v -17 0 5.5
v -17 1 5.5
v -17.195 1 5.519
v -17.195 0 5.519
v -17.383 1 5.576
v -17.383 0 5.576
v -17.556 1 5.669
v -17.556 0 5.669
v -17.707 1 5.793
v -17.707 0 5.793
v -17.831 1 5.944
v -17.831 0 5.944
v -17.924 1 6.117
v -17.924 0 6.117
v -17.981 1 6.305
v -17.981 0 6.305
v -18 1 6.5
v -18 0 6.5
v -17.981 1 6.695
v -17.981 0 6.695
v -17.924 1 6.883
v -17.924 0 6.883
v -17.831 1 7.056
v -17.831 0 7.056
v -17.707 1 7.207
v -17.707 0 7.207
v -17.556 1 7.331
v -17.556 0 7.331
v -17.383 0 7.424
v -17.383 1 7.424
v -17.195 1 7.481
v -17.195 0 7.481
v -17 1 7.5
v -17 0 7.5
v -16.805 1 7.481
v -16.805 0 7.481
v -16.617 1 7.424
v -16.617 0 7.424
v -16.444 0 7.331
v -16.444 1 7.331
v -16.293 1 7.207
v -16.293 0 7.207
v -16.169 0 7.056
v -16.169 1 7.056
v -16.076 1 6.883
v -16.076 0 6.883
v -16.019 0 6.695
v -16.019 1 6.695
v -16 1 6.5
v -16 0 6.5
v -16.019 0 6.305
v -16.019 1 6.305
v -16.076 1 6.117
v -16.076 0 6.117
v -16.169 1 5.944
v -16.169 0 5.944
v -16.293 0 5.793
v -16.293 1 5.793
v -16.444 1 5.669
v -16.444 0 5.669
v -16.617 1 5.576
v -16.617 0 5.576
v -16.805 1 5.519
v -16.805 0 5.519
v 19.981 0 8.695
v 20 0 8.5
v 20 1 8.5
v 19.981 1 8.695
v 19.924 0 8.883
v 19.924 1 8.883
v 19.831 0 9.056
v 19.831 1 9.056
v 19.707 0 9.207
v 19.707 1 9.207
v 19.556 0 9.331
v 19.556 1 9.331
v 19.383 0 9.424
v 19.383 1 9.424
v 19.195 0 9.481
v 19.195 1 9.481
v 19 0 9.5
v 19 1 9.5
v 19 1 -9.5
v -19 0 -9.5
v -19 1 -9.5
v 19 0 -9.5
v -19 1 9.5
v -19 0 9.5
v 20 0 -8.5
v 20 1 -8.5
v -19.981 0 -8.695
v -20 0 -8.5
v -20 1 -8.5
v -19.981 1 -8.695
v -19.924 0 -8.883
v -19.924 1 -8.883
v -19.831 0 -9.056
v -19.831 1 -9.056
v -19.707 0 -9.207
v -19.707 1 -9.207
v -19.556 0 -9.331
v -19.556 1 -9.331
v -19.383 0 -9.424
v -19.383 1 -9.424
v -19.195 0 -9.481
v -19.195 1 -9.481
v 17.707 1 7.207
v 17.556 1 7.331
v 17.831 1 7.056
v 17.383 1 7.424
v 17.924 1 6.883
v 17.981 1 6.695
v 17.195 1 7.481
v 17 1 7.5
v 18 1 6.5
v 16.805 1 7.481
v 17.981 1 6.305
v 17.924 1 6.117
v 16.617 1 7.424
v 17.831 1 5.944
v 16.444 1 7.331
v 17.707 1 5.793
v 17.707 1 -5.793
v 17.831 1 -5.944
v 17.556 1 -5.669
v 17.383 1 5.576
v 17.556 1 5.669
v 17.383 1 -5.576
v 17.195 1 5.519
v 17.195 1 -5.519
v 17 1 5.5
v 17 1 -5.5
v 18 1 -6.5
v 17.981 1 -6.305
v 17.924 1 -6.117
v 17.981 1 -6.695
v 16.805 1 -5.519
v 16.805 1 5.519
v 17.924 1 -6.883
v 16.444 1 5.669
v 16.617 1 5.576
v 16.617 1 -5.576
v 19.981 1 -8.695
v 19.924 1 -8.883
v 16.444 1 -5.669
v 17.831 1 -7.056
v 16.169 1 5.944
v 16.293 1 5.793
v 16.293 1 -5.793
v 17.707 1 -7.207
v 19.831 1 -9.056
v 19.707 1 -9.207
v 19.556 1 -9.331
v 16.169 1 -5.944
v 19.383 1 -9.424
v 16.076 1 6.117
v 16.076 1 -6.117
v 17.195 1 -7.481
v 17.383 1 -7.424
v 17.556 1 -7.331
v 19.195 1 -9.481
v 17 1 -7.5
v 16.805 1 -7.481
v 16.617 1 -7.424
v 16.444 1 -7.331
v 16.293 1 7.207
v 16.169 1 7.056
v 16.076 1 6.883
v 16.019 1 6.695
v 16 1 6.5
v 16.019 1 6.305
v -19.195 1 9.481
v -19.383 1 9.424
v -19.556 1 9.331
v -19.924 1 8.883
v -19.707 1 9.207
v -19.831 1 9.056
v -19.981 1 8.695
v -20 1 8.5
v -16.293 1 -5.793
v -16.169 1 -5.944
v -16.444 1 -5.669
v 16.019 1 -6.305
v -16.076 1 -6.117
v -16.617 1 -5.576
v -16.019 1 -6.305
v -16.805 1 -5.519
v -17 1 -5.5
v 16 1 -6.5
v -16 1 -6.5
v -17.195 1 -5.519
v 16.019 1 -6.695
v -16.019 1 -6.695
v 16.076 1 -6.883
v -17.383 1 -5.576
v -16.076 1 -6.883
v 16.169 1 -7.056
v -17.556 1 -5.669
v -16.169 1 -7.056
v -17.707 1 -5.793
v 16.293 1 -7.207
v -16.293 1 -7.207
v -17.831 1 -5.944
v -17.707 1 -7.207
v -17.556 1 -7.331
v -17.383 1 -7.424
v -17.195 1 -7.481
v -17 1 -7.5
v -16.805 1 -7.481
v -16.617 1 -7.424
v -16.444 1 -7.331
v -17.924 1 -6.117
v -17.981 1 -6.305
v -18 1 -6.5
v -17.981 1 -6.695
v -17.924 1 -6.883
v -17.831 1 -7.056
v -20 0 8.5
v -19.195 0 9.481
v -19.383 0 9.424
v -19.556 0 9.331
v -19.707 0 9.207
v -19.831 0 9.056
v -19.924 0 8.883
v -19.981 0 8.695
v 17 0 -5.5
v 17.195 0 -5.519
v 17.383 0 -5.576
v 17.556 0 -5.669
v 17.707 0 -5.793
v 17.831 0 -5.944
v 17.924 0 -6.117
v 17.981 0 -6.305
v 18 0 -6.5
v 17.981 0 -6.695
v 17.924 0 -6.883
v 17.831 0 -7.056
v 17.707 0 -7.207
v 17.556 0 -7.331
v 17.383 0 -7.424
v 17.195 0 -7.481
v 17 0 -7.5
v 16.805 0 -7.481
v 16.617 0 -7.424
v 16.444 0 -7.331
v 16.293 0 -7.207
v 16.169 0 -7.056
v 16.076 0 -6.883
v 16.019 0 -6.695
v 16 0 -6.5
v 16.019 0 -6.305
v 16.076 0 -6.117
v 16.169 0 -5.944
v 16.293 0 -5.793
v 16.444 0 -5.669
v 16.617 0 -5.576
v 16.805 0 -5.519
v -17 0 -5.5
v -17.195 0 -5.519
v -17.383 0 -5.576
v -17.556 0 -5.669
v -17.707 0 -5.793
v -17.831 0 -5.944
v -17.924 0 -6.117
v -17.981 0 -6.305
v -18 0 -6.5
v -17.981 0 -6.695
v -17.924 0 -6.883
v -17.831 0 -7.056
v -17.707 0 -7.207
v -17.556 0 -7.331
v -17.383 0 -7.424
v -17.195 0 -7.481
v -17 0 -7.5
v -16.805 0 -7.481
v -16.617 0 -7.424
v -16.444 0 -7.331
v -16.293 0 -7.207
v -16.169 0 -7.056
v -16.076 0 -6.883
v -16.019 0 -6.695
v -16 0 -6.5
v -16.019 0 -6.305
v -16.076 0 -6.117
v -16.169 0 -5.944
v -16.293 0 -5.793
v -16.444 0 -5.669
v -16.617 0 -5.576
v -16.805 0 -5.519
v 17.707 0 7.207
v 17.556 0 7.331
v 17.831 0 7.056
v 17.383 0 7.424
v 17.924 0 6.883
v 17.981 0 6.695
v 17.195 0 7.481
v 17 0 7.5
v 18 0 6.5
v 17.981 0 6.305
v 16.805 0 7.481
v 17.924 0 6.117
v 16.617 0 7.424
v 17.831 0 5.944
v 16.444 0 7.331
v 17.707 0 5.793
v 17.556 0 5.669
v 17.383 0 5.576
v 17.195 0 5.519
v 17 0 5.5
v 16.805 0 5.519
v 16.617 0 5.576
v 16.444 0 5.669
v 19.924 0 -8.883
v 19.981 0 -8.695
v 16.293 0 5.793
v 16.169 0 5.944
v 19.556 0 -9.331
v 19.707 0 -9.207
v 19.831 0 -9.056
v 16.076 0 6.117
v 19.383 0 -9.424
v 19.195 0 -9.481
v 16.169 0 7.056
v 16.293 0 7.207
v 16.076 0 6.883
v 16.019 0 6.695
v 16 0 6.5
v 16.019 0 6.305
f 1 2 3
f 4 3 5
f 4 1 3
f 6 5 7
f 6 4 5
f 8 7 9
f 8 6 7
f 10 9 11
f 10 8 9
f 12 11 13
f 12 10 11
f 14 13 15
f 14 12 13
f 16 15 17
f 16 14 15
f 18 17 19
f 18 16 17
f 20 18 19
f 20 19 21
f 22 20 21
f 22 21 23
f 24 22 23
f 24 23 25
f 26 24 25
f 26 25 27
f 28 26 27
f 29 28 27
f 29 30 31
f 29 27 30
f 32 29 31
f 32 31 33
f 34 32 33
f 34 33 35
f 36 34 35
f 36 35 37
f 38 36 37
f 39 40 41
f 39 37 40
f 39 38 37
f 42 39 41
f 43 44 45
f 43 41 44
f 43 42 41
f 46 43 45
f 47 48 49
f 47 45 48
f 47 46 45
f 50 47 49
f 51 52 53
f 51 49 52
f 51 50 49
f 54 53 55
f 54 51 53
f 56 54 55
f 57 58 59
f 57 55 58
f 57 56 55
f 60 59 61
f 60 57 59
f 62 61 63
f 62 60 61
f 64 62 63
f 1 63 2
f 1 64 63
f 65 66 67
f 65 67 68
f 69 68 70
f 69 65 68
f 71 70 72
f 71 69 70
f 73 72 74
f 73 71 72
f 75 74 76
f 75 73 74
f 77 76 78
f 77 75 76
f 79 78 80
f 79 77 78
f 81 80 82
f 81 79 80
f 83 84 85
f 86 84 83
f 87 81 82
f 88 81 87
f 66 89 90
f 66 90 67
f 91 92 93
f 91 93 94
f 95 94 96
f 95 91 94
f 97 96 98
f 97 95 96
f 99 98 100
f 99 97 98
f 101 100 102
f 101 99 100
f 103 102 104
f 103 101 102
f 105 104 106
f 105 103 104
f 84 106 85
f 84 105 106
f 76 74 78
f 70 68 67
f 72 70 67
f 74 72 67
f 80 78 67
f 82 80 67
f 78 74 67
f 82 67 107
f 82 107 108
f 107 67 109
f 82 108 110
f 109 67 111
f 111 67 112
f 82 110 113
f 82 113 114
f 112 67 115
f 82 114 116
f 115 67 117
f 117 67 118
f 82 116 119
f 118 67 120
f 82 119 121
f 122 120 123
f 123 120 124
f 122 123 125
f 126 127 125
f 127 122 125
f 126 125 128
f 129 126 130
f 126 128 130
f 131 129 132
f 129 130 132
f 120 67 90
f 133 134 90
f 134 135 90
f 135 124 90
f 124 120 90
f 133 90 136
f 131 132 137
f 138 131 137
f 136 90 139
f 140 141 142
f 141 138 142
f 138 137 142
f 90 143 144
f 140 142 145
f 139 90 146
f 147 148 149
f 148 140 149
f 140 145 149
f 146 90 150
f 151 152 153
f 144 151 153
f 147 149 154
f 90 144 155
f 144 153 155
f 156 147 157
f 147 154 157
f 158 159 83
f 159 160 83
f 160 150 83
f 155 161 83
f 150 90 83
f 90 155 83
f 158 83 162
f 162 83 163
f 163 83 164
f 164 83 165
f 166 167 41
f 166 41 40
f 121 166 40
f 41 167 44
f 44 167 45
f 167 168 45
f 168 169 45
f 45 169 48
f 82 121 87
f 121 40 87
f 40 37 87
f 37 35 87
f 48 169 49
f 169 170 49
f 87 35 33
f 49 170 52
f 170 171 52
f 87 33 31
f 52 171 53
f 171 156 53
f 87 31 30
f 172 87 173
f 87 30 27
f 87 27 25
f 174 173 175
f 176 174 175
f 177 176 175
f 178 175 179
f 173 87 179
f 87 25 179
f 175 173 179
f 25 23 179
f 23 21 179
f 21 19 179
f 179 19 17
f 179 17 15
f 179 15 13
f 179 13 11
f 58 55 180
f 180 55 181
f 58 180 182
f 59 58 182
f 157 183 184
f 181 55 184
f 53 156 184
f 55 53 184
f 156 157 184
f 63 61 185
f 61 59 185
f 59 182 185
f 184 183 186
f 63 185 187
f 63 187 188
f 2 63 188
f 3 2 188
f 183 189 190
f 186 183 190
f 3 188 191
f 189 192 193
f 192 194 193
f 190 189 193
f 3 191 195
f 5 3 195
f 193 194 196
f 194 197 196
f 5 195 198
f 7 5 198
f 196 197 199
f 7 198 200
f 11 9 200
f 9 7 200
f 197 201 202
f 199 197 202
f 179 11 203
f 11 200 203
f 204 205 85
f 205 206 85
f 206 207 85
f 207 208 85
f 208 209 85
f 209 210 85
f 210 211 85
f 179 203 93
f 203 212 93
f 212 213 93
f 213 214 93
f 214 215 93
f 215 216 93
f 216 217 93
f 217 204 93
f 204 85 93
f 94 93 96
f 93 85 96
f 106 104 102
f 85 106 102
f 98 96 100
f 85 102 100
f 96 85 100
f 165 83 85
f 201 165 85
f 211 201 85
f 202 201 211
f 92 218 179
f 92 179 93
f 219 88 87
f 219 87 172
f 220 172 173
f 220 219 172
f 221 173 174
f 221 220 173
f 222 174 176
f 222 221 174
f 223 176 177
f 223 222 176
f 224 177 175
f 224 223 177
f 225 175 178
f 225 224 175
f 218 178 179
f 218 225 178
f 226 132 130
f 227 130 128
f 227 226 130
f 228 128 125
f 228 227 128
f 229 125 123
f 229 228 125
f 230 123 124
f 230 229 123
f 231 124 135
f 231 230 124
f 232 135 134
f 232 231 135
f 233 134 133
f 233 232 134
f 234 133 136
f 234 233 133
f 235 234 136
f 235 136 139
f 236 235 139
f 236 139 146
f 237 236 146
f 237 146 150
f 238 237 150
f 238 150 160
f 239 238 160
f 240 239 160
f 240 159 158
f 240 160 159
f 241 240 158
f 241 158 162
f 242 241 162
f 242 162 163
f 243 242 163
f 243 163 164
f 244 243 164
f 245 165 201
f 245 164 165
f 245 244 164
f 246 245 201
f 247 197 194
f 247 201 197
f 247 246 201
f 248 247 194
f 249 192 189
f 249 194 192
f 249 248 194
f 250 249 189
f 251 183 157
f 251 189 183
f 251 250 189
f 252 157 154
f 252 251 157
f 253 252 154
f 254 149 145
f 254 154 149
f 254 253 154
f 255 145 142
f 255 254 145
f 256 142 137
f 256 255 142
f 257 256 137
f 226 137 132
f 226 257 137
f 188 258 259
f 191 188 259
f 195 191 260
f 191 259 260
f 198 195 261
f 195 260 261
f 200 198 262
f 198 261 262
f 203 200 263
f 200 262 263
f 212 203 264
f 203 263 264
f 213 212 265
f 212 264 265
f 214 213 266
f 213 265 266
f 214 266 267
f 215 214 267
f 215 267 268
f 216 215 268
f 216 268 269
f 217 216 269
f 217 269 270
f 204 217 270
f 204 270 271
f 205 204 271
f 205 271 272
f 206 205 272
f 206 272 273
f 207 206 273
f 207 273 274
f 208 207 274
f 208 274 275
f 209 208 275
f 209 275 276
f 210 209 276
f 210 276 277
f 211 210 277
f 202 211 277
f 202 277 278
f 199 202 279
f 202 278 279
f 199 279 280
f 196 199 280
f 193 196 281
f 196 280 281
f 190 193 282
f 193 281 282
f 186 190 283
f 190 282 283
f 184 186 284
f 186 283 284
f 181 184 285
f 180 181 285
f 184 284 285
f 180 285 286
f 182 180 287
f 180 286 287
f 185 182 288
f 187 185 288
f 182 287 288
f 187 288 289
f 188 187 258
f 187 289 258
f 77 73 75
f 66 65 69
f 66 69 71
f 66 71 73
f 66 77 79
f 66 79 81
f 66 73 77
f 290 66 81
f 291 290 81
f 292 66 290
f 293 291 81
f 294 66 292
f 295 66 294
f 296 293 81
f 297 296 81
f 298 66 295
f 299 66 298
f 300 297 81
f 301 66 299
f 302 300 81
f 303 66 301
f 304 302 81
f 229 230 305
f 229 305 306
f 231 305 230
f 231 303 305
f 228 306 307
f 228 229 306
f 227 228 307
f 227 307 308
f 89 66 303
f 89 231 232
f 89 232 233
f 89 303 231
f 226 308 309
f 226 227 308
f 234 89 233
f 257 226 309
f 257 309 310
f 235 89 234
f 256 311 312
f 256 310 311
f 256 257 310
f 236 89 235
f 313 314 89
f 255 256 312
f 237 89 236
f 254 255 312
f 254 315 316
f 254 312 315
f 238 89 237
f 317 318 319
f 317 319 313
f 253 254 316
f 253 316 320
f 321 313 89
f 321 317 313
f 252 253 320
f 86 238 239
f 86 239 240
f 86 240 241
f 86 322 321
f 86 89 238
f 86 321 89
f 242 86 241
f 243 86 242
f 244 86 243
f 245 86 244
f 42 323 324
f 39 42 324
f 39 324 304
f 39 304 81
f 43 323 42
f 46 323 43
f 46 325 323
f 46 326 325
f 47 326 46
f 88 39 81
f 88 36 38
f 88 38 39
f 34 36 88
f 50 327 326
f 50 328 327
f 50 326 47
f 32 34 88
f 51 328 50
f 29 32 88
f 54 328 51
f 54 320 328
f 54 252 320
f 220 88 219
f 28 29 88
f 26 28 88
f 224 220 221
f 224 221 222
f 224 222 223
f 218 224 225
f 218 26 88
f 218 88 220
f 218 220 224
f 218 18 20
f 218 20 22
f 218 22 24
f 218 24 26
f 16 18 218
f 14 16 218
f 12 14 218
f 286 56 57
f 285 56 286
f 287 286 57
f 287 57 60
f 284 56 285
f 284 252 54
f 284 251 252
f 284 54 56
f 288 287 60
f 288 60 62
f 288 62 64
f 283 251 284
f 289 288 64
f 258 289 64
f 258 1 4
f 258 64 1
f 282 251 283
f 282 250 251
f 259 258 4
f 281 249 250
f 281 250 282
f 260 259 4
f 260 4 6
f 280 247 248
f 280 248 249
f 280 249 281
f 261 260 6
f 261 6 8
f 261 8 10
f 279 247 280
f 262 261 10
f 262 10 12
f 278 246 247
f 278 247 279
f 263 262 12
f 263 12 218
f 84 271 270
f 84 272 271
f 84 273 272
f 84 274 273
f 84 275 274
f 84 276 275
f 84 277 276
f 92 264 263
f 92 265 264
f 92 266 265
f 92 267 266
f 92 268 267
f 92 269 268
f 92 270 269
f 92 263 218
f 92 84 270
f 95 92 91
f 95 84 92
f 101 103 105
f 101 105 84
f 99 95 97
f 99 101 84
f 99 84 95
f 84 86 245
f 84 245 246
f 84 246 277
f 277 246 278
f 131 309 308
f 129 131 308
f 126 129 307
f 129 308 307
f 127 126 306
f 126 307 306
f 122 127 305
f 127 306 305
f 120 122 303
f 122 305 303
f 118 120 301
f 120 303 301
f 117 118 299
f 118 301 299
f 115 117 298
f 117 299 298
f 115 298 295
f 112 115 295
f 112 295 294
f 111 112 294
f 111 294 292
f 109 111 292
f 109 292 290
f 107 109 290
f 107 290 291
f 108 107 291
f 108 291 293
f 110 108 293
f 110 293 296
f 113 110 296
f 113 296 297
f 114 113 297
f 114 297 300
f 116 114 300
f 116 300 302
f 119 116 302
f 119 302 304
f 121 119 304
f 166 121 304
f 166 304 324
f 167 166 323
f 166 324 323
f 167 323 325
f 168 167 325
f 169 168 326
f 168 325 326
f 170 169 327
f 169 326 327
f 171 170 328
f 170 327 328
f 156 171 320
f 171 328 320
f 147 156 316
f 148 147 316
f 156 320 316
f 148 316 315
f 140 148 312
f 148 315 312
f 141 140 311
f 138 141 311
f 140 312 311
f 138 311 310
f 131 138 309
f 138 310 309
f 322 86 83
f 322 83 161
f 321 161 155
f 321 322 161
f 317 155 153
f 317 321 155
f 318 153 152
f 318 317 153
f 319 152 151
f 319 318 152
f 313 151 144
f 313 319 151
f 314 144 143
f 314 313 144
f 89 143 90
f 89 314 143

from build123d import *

# Parameters (mm, degrees)
SALIENTE_EXTRUIR1_DEPTH   = 1
CROQUIS2_R                = 1
CORTAR_EXTRUIR1_DEPTH     = 23.164160259
SIMETR_A2_COPY_1_SKETCH_R = 1
SIMETR_A2_COPY_1_DEPTH    = 23.164160259


with BuildPart() as part:
    # Croquis1 → Saliente-Extruir1 (new body)
    with BuildSketch(Plane(origin=(0, 0, 0), x_dir=(1, 0, 0), z_dir=(0, 1, 0))):
        with BuildLine():
            Line((-19, -9.5), (19, -9.5))
            ThreePointArc((19, -9.5), (19.707106781, -9.207106781), (20, -8.5))
            Line((20, -8.5), (20, 8.5))
            ThreePointArc((20, 8.5), (19.707106781, 9.207106781), (19, 9.5))
            Line((19, 9.5), (-19, 9.5))
            ThreePointArc((-19, 9.5), (-19.707106781, 9.207106781), (-20, 8.5))
            Line((-20, 8.5), (-20, -8.5))
            ThreePointArc((-20, -8.5), (-19.707106781, -9.207106781), (-19, -9.5))
        make_face()
    extrude(amount=SALIENTE_EXTRUIR1_DEPTH)

    # Croquis2 → Cortar-Extruir1 (cut, through all)
    with BuildSketch(Plane.XZ):
        with Locations((17, 6.5)):
            Circle(CROQUIS2_R)
    cortar_extruir1 = extrude(amount=-CORTAR_EXTRUIR1_DEPTH, mode=Mode.SUBTRACT)

    # Simetría1: Cortar-Extruir1 across plane
    add(cortar_extruir1.mirror(Plane(origin=(0, 0, 0), x_dir=(1, 0, 0), z_dir=(0, 0, -1))), mode=Mode.SUBTRACT)

    # Simetría2: Cortar-Extruir1 across plane
    add(cortar_extruir1.mirror(Plane(origin=(0, 0, 0), x_dir=(0, 0, 1), z_dir=(1, 0, 0))), mode=Mode.SUBTRACT)

    # Simetría2 copy 1 sketch → Simetría2 copy 1 (cut, through all)
    with BuildSketch(Plane(origin=(0, 0, 0), x_dir=(-1, 0, 0), z_dir=(0, -1, 0))):
        with Locations((17, 6.5)):
            Circle(SIMETR_A2_COPY_1_SKETCH_R)
    extrude(amount=-SIMETR_A2_COPY_1_DEPTH, mode=Mode.SUBTRACT)


solid = part.part
